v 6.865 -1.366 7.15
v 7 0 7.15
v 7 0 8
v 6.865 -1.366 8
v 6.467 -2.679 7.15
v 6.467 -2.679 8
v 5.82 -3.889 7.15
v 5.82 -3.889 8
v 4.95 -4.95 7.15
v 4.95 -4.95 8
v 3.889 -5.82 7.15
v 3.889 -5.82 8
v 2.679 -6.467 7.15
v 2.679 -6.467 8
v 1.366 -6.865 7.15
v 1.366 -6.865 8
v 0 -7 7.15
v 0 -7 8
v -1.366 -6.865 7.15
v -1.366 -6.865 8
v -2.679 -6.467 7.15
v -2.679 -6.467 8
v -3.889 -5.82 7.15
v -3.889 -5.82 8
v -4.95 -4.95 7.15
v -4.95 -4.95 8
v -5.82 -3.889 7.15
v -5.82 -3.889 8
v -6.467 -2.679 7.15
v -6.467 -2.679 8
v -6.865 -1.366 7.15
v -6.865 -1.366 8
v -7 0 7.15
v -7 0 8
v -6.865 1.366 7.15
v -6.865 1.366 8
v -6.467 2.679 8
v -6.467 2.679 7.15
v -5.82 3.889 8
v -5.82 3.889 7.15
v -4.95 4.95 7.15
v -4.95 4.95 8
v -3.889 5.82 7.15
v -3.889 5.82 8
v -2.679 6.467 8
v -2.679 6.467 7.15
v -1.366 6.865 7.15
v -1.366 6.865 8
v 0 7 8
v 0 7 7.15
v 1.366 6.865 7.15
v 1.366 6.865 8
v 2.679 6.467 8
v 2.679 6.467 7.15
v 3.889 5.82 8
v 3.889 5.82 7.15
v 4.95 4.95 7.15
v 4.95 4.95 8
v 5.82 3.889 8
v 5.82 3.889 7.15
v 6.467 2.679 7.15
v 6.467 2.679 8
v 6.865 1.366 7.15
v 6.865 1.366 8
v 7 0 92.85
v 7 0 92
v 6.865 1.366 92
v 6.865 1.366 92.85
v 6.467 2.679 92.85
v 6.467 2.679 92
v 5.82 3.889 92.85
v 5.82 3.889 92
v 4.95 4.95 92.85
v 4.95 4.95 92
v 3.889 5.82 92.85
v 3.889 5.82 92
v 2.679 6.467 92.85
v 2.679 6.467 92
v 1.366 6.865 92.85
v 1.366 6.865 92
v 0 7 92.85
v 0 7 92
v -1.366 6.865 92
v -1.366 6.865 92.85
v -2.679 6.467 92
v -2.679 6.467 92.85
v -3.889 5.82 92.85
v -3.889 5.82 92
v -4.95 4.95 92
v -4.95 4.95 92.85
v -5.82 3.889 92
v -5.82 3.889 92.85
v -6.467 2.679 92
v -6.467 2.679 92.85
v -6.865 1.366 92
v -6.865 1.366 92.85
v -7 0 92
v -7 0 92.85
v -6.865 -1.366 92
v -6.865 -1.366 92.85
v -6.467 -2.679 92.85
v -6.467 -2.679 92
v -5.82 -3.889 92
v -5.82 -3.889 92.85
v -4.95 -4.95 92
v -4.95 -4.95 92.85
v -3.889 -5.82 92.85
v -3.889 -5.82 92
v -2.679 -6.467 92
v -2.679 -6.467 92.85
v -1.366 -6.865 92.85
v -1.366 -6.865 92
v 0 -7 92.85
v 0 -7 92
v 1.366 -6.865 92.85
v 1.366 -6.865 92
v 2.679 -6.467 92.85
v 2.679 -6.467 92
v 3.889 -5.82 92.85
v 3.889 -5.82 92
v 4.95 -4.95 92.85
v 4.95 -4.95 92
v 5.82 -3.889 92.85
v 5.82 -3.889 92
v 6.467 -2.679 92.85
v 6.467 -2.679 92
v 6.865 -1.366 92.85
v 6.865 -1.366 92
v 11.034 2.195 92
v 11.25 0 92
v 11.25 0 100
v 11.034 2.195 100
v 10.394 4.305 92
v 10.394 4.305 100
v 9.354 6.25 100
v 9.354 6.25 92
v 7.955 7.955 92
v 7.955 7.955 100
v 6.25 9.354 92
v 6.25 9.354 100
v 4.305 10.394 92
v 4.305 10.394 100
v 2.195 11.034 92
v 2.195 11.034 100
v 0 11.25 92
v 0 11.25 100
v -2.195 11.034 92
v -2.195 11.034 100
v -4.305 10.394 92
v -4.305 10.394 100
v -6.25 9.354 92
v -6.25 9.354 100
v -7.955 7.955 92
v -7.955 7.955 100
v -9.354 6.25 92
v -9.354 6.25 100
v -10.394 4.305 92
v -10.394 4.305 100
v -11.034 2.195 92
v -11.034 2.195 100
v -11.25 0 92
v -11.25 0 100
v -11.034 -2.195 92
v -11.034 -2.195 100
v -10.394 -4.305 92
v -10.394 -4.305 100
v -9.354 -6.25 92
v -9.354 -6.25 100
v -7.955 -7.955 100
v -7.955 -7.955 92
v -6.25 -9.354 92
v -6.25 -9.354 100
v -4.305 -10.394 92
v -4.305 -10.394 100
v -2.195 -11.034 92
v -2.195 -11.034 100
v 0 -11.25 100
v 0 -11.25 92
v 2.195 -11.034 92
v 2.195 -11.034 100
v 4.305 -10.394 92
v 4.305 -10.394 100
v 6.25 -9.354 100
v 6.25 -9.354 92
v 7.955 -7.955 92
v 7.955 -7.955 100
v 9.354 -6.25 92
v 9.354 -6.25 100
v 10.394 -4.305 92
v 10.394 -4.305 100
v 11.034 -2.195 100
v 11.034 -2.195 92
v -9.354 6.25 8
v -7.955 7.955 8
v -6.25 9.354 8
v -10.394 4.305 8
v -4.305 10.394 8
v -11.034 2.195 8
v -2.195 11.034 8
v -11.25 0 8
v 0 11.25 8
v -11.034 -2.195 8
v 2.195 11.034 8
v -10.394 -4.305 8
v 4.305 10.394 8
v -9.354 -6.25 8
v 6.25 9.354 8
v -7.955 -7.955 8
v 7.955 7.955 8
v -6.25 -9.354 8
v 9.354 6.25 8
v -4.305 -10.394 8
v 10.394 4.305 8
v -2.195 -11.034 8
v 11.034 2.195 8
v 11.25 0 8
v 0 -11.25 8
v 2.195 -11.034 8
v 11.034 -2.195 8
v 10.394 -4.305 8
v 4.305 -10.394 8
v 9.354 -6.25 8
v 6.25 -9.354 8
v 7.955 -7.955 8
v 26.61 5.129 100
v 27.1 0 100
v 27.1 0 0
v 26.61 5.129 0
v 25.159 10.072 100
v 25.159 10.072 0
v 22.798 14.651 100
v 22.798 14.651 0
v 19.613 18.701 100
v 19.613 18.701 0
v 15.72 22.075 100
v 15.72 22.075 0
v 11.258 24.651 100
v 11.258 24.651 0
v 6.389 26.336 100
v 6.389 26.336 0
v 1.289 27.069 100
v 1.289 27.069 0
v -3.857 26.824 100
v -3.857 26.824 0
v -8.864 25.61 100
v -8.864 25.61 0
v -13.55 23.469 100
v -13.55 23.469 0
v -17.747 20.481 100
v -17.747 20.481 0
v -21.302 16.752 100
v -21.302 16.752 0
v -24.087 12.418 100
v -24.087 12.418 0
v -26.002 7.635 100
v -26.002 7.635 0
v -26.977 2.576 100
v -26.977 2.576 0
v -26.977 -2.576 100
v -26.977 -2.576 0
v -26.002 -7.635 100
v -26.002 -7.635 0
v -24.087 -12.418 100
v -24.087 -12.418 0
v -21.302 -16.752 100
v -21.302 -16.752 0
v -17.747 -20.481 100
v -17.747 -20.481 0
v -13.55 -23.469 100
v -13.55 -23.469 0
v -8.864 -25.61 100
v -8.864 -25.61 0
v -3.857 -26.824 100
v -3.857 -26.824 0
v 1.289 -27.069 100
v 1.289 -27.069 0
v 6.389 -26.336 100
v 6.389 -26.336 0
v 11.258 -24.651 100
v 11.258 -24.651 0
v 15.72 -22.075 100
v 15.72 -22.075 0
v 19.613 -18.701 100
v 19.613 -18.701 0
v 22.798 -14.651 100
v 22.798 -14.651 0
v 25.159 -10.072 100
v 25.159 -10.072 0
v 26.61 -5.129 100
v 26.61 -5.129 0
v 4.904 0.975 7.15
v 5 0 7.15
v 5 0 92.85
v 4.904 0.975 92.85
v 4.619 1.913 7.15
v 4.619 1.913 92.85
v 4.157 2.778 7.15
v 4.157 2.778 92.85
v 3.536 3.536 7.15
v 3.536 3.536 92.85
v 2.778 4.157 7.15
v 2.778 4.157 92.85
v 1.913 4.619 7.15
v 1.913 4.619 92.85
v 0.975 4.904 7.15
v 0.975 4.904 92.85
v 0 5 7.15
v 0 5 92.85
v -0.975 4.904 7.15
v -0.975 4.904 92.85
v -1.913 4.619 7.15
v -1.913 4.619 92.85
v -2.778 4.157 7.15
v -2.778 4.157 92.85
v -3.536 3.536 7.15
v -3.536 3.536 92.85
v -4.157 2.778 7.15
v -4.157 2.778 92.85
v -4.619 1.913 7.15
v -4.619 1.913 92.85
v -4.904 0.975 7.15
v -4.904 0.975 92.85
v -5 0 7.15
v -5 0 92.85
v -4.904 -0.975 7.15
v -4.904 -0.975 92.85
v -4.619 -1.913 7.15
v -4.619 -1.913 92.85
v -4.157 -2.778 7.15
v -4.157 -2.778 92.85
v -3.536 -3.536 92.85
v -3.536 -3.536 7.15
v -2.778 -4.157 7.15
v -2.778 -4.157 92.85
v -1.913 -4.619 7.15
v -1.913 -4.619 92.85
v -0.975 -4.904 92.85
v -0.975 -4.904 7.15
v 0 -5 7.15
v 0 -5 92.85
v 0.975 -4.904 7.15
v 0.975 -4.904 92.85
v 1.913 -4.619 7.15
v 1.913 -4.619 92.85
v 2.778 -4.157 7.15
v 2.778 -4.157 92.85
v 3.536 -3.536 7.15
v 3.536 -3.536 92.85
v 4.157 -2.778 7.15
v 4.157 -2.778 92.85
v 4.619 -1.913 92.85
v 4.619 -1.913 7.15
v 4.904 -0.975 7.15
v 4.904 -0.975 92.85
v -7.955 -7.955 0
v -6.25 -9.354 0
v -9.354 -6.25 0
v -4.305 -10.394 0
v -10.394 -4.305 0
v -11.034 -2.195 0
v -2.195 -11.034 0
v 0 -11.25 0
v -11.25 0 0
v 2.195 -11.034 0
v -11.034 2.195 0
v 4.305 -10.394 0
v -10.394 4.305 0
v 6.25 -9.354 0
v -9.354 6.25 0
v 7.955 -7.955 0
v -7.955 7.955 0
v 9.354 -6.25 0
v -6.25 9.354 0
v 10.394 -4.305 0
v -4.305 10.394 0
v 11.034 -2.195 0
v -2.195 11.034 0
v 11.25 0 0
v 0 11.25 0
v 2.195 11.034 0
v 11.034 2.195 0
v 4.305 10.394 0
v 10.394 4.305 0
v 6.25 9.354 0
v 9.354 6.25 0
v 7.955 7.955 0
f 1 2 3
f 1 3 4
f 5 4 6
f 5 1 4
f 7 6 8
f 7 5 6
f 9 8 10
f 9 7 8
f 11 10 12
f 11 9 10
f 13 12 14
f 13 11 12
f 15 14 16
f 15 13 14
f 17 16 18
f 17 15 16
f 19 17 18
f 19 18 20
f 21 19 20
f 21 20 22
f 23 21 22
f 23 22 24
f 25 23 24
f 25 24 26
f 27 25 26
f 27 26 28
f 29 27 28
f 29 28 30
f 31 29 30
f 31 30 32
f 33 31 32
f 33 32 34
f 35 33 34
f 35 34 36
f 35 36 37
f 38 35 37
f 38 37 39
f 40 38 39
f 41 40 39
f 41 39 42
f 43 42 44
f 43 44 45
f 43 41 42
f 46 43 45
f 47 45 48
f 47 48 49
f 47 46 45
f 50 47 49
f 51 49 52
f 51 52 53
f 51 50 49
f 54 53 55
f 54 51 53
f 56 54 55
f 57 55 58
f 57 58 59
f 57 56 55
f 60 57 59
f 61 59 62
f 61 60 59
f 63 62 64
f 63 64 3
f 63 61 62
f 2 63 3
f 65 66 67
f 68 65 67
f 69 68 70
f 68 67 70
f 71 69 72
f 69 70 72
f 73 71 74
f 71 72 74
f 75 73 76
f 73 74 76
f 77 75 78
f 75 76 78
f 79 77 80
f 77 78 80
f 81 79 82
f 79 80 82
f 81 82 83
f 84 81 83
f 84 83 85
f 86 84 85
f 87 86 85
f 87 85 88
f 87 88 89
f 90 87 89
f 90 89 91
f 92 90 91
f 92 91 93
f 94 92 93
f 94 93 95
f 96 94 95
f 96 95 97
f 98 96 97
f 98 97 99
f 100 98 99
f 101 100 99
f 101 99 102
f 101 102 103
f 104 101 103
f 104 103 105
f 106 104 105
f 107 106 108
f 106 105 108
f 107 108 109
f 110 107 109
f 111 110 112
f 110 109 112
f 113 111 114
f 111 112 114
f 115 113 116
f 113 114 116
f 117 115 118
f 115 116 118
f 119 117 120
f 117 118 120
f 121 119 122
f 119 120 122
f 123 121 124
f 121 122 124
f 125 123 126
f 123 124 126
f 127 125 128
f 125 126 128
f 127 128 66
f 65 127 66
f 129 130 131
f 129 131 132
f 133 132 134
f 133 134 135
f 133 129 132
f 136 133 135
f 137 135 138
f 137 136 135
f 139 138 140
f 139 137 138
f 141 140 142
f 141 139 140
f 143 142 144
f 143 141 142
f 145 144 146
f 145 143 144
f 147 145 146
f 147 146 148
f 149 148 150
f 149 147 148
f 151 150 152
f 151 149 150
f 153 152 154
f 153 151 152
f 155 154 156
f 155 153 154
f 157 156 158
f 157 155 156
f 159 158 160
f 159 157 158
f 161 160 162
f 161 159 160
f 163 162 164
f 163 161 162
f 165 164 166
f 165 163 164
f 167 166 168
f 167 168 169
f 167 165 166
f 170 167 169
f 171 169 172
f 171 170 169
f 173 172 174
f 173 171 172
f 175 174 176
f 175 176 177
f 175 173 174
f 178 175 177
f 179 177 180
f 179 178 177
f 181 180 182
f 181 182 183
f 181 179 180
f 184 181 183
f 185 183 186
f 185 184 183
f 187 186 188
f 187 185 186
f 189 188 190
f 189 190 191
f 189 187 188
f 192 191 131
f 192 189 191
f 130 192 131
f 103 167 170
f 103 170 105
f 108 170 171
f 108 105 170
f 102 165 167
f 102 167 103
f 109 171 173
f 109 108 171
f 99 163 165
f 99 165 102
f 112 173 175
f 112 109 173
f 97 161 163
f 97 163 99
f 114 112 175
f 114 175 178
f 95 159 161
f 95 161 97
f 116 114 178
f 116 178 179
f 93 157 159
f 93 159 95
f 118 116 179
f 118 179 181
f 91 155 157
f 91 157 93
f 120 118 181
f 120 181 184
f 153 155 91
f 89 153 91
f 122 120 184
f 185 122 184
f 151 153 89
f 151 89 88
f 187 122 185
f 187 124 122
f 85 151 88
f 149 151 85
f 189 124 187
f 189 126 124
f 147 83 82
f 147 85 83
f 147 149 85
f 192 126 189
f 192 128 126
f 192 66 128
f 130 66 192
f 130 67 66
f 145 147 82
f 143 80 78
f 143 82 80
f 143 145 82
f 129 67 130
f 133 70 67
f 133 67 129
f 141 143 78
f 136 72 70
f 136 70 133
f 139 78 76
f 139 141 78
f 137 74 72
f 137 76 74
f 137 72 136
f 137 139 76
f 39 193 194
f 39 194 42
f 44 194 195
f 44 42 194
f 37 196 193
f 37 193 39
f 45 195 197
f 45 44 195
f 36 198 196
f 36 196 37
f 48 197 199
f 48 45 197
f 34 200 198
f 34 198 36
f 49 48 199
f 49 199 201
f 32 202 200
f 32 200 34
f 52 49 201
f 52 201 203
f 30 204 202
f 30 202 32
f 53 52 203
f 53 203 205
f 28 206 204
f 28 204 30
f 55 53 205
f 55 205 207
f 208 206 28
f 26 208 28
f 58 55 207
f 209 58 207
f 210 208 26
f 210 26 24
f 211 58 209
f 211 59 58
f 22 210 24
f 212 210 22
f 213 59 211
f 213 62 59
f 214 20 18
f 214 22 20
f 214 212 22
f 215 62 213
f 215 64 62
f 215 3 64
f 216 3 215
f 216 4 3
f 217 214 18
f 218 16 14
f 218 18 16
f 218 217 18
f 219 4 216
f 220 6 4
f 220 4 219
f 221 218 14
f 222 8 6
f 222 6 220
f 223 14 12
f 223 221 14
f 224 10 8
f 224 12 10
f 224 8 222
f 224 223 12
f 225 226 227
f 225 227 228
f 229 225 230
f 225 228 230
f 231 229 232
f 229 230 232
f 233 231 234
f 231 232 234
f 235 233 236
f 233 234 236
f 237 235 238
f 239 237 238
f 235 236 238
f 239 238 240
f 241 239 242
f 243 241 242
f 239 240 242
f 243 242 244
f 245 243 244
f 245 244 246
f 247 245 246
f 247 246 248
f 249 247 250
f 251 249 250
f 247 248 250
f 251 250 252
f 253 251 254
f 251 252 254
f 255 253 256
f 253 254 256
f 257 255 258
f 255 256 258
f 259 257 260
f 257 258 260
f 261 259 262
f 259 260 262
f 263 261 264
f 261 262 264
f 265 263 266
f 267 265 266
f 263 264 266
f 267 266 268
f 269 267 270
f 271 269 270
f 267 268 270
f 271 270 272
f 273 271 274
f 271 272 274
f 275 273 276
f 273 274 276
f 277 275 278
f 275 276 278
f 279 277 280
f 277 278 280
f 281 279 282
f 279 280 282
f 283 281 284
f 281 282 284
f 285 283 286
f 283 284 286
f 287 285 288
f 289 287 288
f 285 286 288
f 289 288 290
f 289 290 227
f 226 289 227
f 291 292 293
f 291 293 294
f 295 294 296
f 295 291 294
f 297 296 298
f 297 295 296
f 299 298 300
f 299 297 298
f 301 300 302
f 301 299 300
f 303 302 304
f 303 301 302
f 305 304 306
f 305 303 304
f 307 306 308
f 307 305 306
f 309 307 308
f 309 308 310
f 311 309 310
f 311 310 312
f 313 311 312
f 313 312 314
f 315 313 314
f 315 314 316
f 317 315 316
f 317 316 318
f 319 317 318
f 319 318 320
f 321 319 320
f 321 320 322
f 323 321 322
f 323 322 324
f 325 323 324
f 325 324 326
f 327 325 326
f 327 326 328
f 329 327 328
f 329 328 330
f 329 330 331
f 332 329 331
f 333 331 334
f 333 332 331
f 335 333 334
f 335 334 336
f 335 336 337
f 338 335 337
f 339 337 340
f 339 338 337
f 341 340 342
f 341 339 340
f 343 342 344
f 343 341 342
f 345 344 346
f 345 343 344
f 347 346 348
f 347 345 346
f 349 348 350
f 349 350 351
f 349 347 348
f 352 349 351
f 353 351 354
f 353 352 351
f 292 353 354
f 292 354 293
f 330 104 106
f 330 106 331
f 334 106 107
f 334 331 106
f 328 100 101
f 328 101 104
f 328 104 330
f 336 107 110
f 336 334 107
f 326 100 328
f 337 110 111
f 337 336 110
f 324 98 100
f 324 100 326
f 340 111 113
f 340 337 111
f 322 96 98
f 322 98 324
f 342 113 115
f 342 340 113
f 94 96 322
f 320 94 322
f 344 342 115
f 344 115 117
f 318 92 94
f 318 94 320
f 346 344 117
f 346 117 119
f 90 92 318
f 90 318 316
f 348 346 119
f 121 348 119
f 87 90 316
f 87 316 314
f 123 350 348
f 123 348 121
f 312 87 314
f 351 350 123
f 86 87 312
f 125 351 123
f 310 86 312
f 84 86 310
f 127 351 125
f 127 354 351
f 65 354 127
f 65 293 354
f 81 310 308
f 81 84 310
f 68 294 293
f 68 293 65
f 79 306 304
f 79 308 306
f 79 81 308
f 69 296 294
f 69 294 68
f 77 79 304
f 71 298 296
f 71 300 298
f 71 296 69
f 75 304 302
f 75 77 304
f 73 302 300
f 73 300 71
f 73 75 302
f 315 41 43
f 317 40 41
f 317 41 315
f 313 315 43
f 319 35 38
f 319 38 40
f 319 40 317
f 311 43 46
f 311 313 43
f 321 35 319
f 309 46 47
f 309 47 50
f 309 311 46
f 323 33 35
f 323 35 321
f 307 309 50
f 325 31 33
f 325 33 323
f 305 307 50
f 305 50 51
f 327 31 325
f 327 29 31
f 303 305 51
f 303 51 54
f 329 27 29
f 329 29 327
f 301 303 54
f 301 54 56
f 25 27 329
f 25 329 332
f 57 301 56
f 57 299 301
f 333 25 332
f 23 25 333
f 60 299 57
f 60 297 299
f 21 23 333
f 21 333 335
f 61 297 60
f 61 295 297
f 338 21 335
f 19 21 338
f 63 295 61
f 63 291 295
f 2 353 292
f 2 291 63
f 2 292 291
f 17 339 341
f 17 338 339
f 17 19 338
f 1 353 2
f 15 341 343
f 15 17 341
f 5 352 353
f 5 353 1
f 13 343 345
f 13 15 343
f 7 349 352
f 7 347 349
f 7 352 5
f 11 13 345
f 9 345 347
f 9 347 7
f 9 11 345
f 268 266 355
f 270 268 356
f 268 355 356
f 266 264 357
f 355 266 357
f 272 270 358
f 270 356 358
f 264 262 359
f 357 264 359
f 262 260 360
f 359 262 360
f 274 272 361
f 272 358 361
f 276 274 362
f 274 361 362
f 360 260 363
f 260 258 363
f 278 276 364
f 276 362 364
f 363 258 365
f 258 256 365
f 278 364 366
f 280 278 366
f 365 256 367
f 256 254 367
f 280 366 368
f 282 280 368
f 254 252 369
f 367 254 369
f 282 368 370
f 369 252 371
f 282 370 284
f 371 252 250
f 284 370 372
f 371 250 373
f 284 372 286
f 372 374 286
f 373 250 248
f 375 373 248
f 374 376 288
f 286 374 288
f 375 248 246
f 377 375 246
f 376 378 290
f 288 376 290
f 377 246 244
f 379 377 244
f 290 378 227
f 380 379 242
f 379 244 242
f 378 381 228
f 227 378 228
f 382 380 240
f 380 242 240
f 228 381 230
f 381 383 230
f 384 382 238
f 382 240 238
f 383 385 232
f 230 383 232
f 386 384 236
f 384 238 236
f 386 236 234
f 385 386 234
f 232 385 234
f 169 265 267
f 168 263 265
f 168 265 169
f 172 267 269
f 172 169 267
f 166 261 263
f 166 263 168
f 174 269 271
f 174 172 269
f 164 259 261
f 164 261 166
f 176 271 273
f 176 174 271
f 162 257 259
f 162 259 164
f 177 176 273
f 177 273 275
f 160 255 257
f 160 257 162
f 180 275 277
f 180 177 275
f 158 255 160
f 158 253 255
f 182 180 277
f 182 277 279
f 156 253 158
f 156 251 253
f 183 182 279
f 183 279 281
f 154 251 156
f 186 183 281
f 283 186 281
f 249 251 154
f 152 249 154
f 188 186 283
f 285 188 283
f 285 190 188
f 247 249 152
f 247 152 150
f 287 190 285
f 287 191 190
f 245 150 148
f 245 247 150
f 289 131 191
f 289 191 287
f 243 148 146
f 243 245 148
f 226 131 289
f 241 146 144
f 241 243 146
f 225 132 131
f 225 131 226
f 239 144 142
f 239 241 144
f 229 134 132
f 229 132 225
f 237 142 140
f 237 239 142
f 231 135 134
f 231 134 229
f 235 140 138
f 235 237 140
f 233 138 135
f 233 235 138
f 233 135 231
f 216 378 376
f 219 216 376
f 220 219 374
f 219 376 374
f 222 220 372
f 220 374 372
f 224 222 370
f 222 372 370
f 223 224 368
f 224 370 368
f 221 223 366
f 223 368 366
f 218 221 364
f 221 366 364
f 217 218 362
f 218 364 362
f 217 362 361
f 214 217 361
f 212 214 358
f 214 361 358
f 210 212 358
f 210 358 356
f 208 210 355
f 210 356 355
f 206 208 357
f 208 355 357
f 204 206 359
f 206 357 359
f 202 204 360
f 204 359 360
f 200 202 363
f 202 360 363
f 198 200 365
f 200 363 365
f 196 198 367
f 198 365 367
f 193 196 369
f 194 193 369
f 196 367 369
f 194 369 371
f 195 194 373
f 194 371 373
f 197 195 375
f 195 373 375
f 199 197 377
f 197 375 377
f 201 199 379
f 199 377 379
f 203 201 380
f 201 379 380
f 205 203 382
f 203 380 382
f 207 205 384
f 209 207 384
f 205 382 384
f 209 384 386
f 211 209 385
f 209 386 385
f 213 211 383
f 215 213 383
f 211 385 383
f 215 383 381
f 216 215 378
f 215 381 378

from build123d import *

# Parameters (mm, degrees)
SKETCH1_R           = 27.1
SKETCH1_R_2         = 5
BOSS_EXTRUDE1_DEPTH = 100
CUT_EXTRUDE1_START  = -7.15
SKETCH2_R           = 7
SKETCH2_R_2         = 5
CUT_EXTRUDE1_DEPTH  = 7.15
CUT_EXTRUDE2_START  = -8
SKETCH3_R           = 11.25
SKETCH3_R_2         = 7
CUT_EXTRUDE2_DEPTH  = 8
SKETCH4_R           = 7
CUT_EXTRUDE3_DEPTH  = 7.15
SKETCH5_R           = 11.25
SKETCH5_R_2         = 7
CUT_EXTRUDE4_DEPTH  = 8


with BuildPart() as part:
    # Sketch1 → Boss-Extrude1 (new body)
    with BuildSketch(Plane.XY):
        Circle(SKETCH1_R)
        Circle(SKETCH1_R_2, mode=Mode.SUBTRACT)
    extrude(amount=BOSS_EXTRUDE1_DEPTH)

    # Sketch2 → Cut-Extrude1 (cut)
    with BuildSketch(Plane.XY.offset(100).offset(CUT_EXTRUDE1_START)):
        Circle(SKETCH2_R)
        Circle(SKETCH2_R_2, mode=Mode.SUBTRACT)
    extrude(amount=CUT_EXTRUDE1_DEPTH, mode=Mode.SUBTRACT)

    # Sketch3 → Cut-Extrude2 (cut)
    with BuildSketch(Plane.XY.offset(100).offset(CUT_EXTRUDE2_START)):
        Circle(SKETCH3_R)
        Circle(SKETCH3_R_2, mode=Mode.SUBTRACT)
    extrude(amount=CUT_EXTRUDE2_DEPTH, mode=Mode.SUBTRACT)

    # Sketch4 → Cut-Extrude3 (cut)
    with BuildSketch(Plane(origin=(0, 0, 0), x_dir=(-1, 0, 0), z_dir=(0, 0, -1))):
        with Locations(Location((0, 0, 0), (0, 0, 180))):
            Circle(SKETCH4_R)
    extrude(amount=-CUT_EXTRUDE3_DEPTH, mode=Mode.SUBTRACT)

    # Sketch5 → Cut-Extrude4 (cut)
    with BuildSketch(Plane(origin=(0, 0, 0), x_dir=(-1, 0, 0), z_dir=(0, 0, -1))):
        with Locations(Location((0, 0, 0), (0, 0, 180))):
            Circle(SKETCH5_R)
        with Locations(Location((0, 0, 0), (0, 0, 180))):
            Circle(SKETCH5_R_2, mode=Mode.SUBTRACT)
    extrude(amount=-CUT_EXTRUDE4_DEPTH, mode=Mode.SUBTRACT)


solid = part.part
